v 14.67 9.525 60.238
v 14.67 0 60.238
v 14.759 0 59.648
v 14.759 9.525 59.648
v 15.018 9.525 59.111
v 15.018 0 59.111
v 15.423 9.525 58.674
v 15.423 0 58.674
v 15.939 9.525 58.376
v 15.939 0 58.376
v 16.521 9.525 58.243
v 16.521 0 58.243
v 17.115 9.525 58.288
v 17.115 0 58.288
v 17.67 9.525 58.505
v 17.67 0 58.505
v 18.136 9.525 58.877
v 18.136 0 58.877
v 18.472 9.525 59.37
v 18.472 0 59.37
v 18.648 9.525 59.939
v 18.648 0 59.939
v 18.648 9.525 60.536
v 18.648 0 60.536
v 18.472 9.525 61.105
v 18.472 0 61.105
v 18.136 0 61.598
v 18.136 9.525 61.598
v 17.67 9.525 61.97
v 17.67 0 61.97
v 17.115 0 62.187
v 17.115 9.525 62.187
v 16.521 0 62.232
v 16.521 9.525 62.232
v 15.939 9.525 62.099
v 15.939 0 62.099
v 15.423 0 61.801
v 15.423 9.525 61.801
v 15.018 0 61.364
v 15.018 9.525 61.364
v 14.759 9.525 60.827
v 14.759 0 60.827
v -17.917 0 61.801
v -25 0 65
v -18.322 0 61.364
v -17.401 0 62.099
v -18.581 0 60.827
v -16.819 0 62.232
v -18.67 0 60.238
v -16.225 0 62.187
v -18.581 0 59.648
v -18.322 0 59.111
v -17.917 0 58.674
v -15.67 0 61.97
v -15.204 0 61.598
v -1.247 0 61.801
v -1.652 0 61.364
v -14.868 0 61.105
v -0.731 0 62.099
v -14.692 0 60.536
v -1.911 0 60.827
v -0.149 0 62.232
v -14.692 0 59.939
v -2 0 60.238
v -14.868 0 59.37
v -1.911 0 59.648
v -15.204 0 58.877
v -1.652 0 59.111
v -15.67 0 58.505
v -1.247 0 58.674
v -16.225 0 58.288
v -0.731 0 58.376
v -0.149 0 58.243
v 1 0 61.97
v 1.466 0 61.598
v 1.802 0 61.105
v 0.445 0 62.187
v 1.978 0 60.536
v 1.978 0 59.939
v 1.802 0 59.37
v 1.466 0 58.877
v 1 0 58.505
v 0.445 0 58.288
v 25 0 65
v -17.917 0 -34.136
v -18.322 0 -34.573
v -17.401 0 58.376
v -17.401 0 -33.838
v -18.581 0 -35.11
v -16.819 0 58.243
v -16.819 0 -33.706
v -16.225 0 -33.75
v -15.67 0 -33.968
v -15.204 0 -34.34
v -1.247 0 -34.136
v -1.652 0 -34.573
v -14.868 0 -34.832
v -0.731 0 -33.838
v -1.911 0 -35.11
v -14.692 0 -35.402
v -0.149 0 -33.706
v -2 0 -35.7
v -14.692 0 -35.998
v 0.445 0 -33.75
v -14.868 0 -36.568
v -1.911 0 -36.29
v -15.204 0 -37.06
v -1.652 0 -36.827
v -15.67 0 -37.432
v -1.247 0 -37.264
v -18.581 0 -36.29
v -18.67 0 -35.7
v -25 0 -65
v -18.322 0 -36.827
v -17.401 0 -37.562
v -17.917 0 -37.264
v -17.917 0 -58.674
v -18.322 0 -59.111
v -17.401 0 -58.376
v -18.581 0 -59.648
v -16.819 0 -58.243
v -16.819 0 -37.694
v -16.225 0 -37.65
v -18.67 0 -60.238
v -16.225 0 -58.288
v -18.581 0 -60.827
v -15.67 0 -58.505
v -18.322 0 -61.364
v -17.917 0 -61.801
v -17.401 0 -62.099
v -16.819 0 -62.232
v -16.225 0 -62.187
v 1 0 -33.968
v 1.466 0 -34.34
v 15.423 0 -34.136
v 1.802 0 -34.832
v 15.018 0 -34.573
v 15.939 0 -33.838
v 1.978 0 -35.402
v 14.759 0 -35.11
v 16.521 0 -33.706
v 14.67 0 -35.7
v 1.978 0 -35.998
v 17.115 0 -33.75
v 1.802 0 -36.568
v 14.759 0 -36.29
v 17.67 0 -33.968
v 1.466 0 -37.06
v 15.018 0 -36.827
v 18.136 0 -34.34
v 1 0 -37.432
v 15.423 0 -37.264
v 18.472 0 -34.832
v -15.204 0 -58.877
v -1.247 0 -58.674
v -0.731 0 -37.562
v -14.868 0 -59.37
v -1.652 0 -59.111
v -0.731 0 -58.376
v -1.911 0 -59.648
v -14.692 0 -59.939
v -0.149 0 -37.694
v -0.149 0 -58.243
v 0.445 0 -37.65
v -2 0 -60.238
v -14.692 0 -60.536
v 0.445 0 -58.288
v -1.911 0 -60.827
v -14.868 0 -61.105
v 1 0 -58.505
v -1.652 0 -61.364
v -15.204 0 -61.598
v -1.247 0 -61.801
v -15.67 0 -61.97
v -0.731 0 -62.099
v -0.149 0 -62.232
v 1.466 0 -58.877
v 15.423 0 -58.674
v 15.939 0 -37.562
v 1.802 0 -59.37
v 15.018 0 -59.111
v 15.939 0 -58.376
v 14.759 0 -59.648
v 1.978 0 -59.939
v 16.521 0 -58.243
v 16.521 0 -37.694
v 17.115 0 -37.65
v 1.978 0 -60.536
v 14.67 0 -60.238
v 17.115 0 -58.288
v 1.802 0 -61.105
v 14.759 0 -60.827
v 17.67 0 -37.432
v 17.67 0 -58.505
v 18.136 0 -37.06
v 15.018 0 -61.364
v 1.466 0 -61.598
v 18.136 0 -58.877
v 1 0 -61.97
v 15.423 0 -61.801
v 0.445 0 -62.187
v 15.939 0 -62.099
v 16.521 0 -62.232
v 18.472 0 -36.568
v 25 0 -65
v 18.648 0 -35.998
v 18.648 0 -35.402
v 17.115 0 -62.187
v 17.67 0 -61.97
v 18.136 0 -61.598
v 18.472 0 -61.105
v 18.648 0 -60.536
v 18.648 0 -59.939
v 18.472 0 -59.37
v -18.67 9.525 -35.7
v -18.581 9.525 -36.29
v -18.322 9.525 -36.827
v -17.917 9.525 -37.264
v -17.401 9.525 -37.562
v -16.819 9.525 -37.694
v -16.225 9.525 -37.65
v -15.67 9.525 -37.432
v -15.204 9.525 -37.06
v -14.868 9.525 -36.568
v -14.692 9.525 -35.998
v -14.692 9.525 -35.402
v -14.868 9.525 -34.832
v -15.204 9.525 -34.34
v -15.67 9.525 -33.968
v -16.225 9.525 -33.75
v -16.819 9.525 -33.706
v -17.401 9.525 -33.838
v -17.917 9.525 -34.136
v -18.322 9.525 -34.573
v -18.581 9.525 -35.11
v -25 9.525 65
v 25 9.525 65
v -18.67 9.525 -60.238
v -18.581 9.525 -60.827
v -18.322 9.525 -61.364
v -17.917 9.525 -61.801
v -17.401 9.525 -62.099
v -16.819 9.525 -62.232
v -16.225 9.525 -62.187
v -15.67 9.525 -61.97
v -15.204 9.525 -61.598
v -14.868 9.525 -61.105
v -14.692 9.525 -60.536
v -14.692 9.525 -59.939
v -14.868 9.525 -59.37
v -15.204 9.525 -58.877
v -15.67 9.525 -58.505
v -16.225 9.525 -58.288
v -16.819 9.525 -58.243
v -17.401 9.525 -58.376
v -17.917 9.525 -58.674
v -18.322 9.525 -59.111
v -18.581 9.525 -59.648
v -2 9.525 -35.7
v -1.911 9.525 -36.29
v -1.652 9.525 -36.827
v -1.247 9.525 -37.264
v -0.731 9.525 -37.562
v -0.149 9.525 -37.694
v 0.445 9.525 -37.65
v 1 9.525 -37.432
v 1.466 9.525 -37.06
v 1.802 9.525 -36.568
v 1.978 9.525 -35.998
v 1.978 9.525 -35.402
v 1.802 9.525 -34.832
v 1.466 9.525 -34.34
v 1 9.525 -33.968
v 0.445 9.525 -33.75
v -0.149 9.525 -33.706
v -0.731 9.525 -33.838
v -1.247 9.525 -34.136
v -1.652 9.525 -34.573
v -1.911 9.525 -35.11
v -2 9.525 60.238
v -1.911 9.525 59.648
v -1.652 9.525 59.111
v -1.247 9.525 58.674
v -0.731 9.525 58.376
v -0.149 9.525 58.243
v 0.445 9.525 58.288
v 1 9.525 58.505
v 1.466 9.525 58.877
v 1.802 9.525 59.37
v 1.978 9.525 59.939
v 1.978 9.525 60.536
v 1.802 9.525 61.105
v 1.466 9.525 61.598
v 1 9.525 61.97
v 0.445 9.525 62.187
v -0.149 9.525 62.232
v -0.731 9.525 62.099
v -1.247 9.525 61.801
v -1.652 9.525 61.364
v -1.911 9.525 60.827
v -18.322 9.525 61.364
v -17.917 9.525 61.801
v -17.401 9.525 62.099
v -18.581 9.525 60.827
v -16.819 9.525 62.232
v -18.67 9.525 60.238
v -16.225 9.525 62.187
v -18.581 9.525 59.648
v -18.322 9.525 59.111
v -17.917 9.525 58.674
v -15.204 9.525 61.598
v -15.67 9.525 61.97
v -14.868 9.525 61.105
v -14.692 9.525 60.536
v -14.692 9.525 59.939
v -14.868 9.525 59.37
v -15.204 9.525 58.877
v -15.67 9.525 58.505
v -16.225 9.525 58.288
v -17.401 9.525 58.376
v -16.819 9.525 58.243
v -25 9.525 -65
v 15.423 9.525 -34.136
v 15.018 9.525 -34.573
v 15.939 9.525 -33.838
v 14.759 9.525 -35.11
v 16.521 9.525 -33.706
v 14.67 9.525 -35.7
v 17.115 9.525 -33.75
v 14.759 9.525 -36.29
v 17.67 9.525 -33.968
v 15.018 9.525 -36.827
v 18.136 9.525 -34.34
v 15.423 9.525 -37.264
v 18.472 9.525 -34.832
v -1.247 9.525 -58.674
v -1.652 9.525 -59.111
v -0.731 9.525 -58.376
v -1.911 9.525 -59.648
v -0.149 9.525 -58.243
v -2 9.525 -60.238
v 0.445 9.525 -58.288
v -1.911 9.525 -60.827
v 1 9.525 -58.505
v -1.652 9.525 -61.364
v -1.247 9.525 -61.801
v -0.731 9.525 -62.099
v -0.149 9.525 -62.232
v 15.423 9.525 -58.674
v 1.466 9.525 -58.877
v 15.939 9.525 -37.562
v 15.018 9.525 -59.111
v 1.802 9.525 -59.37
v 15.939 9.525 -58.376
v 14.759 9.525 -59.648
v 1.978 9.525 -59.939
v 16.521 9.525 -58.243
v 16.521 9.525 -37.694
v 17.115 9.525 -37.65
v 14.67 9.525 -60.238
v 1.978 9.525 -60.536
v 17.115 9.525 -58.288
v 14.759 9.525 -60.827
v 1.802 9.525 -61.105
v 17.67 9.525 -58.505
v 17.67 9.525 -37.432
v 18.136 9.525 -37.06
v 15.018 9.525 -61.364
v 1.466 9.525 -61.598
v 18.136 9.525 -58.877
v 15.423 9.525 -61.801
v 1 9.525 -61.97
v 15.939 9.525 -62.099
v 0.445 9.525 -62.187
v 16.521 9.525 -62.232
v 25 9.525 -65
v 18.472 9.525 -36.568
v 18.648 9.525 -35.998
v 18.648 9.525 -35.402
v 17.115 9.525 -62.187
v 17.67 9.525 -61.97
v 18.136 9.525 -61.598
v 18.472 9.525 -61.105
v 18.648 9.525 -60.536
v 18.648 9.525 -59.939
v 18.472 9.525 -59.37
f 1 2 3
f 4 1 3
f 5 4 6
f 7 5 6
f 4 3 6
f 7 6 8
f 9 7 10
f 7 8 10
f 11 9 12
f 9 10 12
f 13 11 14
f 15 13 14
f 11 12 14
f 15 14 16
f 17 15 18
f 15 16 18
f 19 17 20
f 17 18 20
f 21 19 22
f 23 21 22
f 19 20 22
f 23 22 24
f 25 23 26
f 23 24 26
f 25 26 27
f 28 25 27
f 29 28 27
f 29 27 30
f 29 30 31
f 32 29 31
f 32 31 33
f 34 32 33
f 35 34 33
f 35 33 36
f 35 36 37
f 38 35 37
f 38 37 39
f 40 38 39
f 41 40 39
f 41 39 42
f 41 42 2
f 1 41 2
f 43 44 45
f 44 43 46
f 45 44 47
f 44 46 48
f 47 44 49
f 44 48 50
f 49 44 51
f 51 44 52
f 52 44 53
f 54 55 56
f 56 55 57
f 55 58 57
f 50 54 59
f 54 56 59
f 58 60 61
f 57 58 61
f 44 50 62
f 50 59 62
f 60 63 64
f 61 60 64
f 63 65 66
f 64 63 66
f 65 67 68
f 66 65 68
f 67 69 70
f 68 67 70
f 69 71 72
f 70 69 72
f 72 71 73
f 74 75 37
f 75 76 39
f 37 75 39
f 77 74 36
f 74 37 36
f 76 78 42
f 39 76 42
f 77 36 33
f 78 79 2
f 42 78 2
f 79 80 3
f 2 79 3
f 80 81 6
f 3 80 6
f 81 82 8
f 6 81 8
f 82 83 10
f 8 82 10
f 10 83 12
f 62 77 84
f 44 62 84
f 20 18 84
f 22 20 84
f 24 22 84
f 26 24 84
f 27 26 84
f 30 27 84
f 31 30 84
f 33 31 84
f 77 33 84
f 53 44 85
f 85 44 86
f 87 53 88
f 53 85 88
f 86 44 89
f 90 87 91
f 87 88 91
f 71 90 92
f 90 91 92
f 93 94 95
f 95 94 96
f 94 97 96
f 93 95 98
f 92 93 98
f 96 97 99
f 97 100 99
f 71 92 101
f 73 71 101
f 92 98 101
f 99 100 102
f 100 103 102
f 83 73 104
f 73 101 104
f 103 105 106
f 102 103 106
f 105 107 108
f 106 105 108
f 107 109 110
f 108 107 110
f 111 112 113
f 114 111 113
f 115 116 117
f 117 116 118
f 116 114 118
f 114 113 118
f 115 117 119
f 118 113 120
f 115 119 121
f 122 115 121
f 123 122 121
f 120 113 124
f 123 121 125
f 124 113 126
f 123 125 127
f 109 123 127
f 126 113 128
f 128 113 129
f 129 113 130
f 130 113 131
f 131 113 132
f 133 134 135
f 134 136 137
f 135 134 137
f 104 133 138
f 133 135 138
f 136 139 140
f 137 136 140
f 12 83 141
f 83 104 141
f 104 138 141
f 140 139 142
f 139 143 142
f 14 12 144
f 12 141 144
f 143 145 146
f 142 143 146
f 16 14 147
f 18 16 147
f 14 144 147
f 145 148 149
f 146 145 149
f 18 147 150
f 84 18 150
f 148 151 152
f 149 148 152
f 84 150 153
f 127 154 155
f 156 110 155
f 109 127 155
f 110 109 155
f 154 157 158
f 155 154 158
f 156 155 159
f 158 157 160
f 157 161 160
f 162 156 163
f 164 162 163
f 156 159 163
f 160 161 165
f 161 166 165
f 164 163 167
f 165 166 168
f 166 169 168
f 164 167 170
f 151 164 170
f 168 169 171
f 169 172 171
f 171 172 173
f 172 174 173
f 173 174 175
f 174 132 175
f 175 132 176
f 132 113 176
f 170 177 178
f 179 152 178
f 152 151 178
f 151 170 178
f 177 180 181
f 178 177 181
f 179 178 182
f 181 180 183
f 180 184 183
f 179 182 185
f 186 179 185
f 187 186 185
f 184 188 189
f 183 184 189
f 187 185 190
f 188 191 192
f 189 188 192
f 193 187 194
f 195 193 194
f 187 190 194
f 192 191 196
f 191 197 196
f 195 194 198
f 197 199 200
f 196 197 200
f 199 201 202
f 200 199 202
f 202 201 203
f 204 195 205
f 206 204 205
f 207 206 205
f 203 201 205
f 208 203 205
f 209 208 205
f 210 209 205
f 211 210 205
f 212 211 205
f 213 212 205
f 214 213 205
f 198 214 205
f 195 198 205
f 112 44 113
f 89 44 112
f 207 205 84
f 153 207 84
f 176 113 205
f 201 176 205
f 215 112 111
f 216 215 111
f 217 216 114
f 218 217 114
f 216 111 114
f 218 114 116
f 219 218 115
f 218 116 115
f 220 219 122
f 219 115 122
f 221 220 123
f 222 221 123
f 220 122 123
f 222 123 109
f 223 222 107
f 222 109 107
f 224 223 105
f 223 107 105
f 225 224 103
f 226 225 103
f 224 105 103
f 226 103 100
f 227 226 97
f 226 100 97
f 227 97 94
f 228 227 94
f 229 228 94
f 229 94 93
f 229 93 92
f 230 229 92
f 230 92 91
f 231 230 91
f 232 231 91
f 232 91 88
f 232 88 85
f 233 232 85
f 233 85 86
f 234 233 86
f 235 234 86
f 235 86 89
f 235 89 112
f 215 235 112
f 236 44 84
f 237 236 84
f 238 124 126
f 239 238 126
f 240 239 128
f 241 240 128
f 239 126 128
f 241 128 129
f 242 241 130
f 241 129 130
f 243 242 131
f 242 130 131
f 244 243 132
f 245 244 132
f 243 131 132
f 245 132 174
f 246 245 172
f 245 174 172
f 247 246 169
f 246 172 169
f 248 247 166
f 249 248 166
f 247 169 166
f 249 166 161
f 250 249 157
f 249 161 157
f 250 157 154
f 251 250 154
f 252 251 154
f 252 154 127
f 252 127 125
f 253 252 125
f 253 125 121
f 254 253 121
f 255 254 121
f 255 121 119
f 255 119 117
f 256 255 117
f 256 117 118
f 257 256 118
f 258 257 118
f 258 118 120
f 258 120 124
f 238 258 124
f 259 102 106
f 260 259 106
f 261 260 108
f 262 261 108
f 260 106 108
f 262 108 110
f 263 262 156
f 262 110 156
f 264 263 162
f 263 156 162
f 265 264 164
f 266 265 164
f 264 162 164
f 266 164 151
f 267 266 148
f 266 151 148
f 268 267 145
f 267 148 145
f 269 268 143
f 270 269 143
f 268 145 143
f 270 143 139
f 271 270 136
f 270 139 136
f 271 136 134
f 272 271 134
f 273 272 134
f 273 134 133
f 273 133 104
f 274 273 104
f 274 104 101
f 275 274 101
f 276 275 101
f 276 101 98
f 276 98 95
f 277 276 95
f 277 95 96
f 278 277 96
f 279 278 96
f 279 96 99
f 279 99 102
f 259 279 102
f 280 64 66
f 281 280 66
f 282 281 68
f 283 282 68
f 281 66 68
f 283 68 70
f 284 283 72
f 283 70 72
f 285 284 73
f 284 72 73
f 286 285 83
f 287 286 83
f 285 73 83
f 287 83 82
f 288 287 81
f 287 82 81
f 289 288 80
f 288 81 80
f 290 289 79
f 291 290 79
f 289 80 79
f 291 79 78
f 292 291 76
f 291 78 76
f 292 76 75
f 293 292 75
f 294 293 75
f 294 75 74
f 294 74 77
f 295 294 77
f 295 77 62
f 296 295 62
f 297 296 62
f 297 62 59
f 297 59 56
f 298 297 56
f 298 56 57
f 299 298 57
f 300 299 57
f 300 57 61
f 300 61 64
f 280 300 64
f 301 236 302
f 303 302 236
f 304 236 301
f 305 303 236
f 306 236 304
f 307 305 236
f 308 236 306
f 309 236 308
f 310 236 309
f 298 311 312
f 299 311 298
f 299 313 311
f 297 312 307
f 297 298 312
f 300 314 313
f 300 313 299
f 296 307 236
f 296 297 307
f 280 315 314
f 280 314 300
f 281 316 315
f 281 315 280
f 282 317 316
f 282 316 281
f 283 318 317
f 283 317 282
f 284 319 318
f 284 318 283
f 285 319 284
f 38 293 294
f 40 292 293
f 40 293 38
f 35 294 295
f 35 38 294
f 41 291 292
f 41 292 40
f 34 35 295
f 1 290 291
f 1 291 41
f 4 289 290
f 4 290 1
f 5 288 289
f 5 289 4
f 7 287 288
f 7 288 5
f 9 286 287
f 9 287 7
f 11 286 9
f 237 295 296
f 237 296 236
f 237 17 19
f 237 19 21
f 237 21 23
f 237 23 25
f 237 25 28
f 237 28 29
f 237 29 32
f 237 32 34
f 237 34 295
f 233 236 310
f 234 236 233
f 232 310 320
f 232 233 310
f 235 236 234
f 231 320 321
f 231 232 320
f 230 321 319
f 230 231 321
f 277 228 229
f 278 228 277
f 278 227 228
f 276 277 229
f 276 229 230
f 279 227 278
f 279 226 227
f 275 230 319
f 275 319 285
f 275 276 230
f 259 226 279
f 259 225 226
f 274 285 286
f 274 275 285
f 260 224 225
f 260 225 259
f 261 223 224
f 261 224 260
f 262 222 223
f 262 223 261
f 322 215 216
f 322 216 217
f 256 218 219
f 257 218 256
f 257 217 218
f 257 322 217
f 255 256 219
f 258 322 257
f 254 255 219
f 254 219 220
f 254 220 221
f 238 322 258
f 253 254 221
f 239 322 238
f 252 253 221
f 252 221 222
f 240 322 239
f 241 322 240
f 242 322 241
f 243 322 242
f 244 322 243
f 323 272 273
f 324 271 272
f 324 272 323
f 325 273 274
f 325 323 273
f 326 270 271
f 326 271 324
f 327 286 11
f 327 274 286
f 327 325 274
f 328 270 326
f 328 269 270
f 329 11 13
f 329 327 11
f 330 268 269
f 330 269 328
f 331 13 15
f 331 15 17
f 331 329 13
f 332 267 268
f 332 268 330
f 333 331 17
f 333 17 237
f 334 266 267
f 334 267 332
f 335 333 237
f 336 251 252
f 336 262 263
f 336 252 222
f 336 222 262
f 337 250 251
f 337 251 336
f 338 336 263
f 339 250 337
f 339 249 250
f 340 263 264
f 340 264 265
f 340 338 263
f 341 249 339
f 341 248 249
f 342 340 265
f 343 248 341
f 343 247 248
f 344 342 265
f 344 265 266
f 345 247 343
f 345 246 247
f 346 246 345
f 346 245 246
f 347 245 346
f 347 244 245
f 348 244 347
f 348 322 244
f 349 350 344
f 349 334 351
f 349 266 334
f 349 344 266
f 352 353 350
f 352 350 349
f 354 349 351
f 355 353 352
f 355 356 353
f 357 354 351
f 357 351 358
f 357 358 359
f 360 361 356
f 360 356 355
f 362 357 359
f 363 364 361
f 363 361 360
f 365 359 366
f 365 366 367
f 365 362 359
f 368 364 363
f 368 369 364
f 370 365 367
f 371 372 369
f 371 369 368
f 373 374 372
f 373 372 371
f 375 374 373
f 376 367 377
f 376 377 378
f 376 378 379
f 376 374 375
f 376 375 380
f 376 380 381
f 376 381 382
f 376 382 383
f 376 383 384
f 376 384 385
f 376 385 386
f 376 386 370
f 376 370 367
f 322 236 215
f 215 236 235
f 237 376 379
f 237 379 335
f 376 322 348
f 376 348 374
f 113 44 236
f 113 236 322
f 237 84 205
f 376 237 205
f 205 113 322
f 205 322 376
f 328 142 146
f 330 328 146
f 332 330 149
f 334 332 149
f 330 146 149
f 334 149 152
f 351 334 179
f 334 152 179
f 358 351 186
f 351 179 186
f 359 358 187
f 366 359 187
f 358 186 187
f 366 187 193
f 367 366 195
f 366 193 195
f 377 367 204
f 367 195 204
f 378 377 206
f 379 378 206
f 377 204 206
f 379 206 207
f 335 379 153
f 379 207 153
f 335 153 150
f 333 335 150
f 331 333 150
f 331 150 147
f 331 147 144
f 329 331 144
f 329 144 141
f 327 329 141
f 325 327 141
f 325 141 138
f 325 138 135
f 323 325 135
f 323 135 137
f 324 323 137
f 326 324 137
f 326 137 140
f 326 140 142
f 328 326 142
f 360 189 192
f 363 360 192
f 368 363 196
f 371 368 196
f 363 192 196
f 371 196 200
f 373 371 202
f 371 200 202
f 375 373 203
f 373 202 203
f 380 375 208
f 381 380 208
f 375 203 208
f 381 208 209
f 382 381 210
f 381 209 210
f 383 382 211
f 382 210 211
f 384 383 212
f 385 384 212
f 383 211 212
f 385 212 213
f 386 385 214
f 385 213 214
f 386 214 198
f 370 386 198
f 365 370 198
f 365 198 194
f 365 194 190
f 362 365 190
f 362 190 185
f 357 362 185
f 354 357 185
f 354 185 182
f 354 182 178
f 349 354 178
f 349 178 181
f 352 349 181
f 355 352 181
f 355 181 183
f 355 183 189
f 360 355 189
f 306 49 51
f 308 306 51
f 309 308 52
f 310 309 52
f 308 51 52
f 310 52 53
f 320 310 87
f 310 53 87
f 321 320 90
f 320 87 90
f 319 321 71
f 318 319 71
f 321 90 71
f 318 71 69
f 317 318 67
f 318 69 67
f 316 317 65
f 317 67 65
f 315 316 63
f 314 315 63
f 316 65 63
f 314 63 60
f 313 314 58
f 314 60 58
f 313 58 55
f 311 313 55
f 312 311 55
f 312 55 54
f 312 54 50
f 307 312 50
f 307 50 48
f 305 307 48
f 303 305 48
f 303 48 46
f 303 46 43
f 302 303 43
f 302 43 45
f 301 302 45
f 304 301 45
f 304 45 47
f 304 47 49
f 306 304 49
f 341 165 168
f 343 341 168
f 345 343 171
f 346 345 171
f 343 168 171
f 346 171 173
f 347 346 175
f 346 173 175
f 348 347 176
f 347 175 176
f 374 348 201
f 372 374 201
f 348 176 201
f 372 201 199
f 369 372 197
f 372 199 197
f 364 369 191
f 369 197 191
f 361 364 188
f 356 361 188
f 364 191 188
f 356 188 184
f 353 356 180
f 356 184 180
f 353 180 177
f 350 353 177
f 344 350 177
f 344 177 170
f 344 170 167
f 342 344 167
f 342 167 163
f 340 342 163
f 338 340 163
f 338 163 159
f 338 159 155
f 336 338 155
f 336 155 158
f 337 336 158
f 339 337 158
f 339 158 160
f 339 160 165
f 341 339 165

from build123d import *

# Parameters (mm, degrees)
SKETCH2_W             = 50
SKETCH2_H             = 130
BOSS_EXTRUDE1_DEPTH   = 9.525
F_4_0MM_DOWEL_HOLE1_D = 4


with BuildPart() as part:
    # Sketch2 → Boss-Extrude1 (new body)
    with BuildSketch(Plane(origin=(0, 0, 0), x_dir=(1, 0, 0), z_dir=(0, 1, 0))):
        Rectangle(SKETCH2_W, SKETCH2_H)
    extrude(amount=BOSS_EXTRUDE1_DEPTH)

    # Ø4.0mm Dowel Hole1 (through all)
    with Locations(Plane(origin=(0, 9.525, 0), x_dir=(1, 0, 0), z_dir=(0, 1, 0))):
        with Locations((16.67, 60.2375), (-16.67, -60.2375), (0, -60.2375), (16.67, -60.2375), (-16.67, 35.7), (0, 35.7), (16.67, 35.7), (-16.67, 60.2375), (0, 60.2375)):
            Hole(F_4_0MM_DOWEL_HOLE1_D / 2)


solid = part.part
